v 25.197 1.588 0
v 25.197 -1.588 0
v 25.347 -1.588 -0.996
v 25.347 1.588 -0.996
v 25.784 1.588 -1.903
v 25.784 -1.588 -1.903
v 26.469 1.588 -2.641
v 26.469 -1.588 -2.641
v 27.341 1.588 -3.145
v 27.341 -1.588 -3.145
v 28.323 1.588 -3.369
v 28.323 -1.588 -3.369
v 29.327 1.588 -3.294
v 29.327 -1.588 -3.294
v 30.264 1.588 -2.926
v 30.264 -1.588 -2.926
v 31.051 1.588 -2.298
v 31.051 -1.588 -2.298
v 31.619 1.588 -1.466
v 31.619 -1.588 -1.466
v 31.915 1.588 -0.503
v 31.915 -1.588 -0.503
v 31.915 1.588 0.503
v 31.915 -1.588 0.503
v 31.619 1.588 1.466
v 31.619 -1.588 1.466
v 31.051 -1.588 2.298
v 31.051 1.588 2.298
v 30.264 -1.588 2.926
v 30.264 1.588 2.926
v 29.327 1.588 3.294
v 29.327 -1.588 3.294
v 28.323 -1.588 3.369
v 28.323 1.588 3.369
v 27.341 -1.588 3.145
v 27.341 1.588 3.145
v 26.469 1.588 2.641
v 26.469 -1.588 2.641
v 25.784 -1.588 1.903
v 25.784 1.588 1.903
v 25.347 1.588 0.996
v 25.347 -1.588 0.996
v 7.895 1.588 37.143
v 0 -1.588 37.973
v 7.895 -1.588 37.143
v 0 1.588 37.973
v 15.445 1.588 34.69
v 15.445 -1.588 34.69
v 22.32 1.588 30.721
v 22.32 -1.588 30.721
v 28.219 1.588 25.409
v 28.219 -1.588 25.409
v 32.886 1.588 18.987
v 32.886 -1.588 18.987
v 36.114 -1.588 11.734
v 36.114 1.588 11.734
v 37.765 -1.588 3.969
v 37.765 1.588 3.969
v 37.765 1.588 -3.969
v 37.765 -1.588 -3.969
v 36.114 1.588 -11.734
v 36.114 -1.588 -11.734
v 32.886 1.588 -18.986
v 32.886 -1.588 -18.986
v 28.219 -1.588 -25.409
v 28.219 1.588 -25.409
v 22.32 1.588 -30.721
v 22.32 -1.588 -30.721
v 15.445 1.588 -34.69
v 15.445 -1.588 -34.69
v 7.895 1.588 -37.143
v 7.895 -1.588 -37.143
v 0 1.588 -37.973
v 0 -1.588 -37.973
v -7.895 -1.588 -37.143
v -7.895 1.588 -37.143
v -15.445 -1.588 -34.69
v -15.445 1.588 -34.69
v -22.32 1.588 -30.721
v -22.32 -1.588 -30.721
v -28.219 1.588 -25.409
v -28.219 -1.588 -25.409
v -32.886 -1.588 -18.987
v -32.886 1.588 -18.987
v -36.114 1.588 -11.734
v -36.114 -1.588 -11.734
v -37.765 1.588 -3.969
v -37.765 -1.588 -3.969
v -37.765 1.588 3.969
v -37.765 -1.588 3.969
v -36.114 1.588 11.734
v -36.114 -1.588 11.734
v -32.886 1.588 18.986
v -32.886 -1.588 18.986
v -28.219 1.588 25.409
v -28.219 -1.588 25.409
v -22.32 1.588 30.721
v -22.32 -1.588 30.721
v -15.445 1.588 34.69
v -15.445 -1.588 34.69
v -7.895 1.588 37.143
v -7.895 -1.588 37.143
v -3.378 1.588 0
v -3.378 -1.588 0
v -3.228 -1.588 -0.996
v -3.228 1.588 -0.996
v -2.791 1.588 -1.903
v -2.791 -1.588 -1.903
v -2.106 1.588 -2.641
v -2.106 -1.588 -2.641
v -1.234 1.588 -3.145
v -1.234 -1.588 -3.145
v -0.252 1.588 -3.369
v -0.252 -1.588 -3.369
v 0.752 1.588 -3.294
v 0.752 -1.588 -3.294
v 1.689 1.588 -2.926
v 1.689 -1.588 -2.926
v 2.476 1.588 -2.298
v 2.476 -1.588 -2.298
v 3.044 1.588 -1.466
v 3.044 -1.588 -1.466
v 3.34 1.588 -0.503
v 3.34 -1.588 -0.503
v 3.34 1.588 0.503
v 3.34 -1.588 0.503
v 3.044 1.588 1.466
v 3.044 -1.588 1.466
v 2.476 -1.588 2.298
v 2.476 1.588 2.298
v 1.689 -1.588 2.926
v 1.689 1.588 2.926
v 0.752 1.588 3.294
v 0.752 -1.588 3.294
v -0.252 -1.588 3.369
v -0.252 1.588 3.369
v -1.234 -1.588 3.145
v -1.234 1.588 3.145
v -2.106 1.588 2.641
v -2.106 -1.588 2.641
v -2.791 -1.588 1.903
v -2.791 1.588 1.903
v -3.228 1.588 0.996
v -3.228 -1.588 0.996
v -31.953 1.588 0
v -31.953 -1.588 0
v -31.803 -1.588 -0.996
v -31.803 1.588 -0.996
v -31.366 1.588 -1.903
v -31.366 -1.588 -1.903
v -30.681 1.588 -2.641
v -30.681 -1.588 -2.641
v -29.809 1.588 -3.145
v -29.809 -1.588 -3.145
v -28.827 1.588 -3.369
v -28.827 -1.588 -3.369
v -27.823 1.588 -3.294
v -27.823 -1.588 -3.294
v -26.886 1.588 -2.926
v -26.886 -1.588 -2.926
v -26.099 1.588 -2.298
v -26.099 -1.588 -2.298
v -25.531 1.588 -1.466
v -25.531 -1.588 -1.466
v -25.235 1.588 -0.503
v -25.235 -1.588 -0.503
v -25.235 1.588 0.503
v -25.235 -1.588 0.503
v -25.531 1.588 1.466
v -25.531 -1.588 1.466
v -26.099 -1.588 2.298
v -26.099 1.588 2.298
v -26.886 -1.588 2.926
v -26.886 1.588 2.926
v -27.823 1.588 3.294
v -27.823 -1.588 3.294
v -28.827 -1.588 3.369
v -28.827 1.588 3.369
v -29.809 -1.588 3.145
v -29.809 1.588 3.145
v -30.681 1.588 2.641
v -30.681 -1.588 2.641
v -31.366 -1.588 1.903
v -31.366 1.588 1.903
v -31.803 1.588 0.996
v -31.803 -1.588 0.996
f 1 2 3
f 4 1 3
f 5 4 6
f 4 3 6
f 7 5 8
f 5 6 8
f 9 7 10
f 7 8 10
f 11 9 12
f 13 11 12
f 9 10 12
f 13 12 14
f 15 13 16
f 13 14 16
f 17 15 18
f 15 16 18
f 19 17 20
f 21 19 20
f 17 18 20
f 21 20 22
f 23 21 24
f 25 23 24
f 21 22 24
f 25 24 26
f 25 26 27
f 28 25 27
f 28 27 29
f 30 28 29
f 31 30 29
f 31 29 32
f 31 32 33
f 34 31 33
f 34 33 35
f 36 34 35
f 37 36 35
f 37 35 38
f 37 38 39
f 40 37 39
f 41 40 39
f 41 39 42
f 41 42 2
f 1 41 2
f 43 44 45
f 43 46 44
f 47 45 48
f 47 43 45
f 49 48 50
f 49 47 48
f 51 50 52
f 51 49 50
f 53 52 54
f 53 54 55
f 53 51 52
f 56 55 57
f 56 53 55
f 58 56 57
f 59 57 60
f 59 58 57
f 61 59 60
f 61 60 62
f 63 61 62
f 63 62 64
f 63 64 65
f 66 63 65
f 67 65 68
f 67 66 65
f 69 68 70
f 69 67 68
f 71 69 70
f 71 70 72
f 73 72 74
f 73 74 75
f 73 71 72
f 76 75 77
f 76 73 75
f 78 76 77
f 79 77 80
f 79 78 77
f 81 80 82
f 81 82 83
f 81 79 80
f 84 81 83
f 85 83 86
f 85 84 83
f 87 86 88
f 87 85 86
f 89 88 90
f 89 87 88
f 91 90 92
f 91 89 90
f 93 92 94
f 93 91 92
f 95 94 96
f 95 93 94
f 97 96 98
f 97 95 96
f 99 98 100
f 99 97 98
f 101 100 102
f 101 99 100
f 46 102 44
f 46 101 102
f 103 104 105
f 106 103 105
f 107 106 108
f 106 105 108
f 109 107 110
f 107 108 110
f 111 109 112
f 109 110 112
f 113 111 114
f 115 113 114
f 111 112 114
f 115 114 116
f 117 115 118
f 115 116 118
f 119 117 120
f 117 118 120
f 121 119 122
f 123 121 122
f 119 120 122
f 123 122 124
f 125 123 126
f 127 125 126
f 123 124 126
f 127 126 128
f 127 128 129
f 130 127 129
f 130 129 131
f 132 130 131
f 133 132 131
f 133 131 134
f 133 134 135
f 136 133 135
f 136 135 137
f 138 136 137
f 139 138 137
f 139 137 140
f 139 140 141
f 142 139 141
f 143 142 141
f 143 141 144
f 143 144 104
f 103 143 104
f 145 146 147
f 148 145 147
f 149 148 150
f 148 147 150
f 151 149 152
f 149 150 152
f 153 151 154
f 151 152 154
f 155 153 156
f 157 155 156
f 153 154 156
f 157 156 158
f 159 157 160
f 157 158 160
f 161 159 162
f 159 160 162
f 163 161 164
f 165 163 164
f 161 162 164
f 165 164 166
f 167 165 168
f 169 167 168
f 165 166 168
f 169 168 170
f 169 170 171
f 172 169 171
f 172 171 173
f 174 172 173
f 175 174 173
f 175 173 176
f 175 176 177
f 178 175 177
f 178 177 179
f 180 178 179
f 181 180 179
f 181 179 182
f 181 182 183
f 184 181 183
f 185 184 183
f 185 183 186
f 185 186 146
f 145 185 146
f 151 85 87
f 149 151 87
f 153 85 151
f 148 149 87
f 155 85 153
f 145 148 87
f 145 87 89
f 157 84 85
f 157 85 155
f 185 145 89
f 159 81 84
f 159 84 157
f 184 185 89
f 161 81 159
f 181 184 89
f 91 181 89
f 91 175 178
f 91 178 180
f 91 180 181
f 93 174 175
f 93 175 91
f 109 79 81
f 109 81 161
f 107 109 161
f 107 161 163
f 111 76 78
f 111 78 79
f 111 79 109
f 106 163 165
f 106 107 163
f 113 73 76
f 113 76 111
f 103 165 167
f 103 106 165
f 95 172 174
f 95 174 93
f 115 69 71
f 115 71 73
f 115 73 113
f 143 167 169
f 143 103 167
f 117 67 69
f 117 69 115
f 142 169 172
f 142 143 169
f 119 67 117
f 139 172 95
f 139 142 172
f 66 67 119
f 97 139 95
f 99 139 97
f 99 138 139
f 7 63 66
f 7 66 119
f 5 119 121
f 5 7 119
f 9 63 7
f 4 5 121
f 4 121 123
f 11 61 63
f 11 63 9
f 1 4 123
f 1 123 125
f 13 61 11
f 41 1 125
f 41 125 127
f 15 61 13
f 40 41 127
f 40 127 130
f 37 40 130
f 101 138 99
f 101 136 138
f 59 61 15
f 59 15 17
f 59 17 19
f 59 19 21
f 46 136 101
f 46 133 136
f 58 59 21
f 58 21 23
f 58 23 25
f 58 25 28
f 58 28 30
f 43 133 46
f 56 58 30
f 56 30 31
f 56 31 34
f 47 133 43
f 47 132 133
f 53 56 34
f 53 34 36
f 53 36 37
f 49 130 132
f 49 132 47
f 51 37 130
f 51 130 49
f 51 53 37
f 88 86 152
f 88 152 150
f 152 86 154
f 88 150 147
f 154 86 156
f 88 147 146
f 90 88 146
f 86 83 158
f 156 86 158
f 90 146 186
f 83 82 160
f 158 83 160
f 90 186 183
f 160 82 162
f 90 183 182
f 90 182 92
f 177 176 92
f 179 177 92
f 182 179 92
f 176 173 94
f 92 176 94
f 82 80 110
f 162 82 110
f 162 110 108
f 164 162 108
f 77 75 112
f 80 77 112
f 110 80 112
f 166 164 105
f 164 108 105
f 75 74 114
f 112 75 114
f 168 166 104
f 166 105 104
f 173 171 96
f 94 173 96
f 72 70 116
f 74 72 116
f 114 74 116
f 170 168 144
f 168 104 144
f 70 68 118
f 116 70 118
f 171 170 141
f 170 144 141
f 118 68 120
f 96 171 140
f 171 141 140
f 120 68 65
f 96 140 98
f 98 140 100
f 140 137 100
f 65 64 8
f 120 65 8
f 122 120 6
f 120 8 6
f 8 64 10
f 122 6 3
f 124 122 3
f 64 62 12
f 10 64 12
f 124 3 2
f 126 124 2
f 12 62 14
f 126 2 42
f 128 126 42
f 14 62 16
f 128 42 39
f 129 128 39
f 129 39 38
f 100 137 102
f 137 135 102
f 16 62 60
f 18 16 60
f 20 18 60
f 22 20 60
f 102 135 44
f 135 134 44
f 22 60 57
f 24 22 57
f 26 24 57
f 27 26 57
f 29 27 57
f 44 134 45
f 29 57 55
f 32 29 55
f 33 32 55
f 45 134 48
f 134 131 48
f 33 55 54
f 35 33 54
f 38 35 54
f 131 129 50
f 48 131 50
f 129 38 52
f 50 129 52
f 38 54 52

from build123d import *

# Parameters (mm, degrees)
SKETCH1_R                = 37.973
BOSS_EXTRUDE1_DEPTH      = 1.5875
H_0_266_DIAMETER_HOLE1_D = 6.7564
H_0_266_DIAMETER_HOLE2_D = 6.7564


with BuildPart() as part:
    # Sketch1 → Boss-Extrude1 (new, symmetric)
    with BuildSketch(Plane(origin=(0, 0, 0), x_dir=(1, 0, 0), z_dir=(0, 1, 0))):
        with Locations(Location((0, 0, 0), (0, 0, 270))):
            Circle(SKETCH1_R)
    extrude(amount=BOSS_EXTRUDE1_DEPTH, both=True)

    # H (0.266) Diameter Hole1 (through all)
    with Locations(Plane(origin=(0, 1.5875, 0), x_dir=(1, 0, 0), z_dir=(0, 1, 0))):
        with Locations((-28.575, 0), (28.575, 0)):
            Hole(H_0_266_DIAMETER_HOLE1_D / 2)

    # H (0.266) Diameter Hole2 (through all)
    with Locations(Plane(origin=(0, 1.5875, 0), x_dir=(1, 0, 0), z_dir=(0, 1, 0))):
        with Locations((0, 0)):
            Hole(H_0_266_DIAMETER_HOLE2_D / 2)


solid = part.part
